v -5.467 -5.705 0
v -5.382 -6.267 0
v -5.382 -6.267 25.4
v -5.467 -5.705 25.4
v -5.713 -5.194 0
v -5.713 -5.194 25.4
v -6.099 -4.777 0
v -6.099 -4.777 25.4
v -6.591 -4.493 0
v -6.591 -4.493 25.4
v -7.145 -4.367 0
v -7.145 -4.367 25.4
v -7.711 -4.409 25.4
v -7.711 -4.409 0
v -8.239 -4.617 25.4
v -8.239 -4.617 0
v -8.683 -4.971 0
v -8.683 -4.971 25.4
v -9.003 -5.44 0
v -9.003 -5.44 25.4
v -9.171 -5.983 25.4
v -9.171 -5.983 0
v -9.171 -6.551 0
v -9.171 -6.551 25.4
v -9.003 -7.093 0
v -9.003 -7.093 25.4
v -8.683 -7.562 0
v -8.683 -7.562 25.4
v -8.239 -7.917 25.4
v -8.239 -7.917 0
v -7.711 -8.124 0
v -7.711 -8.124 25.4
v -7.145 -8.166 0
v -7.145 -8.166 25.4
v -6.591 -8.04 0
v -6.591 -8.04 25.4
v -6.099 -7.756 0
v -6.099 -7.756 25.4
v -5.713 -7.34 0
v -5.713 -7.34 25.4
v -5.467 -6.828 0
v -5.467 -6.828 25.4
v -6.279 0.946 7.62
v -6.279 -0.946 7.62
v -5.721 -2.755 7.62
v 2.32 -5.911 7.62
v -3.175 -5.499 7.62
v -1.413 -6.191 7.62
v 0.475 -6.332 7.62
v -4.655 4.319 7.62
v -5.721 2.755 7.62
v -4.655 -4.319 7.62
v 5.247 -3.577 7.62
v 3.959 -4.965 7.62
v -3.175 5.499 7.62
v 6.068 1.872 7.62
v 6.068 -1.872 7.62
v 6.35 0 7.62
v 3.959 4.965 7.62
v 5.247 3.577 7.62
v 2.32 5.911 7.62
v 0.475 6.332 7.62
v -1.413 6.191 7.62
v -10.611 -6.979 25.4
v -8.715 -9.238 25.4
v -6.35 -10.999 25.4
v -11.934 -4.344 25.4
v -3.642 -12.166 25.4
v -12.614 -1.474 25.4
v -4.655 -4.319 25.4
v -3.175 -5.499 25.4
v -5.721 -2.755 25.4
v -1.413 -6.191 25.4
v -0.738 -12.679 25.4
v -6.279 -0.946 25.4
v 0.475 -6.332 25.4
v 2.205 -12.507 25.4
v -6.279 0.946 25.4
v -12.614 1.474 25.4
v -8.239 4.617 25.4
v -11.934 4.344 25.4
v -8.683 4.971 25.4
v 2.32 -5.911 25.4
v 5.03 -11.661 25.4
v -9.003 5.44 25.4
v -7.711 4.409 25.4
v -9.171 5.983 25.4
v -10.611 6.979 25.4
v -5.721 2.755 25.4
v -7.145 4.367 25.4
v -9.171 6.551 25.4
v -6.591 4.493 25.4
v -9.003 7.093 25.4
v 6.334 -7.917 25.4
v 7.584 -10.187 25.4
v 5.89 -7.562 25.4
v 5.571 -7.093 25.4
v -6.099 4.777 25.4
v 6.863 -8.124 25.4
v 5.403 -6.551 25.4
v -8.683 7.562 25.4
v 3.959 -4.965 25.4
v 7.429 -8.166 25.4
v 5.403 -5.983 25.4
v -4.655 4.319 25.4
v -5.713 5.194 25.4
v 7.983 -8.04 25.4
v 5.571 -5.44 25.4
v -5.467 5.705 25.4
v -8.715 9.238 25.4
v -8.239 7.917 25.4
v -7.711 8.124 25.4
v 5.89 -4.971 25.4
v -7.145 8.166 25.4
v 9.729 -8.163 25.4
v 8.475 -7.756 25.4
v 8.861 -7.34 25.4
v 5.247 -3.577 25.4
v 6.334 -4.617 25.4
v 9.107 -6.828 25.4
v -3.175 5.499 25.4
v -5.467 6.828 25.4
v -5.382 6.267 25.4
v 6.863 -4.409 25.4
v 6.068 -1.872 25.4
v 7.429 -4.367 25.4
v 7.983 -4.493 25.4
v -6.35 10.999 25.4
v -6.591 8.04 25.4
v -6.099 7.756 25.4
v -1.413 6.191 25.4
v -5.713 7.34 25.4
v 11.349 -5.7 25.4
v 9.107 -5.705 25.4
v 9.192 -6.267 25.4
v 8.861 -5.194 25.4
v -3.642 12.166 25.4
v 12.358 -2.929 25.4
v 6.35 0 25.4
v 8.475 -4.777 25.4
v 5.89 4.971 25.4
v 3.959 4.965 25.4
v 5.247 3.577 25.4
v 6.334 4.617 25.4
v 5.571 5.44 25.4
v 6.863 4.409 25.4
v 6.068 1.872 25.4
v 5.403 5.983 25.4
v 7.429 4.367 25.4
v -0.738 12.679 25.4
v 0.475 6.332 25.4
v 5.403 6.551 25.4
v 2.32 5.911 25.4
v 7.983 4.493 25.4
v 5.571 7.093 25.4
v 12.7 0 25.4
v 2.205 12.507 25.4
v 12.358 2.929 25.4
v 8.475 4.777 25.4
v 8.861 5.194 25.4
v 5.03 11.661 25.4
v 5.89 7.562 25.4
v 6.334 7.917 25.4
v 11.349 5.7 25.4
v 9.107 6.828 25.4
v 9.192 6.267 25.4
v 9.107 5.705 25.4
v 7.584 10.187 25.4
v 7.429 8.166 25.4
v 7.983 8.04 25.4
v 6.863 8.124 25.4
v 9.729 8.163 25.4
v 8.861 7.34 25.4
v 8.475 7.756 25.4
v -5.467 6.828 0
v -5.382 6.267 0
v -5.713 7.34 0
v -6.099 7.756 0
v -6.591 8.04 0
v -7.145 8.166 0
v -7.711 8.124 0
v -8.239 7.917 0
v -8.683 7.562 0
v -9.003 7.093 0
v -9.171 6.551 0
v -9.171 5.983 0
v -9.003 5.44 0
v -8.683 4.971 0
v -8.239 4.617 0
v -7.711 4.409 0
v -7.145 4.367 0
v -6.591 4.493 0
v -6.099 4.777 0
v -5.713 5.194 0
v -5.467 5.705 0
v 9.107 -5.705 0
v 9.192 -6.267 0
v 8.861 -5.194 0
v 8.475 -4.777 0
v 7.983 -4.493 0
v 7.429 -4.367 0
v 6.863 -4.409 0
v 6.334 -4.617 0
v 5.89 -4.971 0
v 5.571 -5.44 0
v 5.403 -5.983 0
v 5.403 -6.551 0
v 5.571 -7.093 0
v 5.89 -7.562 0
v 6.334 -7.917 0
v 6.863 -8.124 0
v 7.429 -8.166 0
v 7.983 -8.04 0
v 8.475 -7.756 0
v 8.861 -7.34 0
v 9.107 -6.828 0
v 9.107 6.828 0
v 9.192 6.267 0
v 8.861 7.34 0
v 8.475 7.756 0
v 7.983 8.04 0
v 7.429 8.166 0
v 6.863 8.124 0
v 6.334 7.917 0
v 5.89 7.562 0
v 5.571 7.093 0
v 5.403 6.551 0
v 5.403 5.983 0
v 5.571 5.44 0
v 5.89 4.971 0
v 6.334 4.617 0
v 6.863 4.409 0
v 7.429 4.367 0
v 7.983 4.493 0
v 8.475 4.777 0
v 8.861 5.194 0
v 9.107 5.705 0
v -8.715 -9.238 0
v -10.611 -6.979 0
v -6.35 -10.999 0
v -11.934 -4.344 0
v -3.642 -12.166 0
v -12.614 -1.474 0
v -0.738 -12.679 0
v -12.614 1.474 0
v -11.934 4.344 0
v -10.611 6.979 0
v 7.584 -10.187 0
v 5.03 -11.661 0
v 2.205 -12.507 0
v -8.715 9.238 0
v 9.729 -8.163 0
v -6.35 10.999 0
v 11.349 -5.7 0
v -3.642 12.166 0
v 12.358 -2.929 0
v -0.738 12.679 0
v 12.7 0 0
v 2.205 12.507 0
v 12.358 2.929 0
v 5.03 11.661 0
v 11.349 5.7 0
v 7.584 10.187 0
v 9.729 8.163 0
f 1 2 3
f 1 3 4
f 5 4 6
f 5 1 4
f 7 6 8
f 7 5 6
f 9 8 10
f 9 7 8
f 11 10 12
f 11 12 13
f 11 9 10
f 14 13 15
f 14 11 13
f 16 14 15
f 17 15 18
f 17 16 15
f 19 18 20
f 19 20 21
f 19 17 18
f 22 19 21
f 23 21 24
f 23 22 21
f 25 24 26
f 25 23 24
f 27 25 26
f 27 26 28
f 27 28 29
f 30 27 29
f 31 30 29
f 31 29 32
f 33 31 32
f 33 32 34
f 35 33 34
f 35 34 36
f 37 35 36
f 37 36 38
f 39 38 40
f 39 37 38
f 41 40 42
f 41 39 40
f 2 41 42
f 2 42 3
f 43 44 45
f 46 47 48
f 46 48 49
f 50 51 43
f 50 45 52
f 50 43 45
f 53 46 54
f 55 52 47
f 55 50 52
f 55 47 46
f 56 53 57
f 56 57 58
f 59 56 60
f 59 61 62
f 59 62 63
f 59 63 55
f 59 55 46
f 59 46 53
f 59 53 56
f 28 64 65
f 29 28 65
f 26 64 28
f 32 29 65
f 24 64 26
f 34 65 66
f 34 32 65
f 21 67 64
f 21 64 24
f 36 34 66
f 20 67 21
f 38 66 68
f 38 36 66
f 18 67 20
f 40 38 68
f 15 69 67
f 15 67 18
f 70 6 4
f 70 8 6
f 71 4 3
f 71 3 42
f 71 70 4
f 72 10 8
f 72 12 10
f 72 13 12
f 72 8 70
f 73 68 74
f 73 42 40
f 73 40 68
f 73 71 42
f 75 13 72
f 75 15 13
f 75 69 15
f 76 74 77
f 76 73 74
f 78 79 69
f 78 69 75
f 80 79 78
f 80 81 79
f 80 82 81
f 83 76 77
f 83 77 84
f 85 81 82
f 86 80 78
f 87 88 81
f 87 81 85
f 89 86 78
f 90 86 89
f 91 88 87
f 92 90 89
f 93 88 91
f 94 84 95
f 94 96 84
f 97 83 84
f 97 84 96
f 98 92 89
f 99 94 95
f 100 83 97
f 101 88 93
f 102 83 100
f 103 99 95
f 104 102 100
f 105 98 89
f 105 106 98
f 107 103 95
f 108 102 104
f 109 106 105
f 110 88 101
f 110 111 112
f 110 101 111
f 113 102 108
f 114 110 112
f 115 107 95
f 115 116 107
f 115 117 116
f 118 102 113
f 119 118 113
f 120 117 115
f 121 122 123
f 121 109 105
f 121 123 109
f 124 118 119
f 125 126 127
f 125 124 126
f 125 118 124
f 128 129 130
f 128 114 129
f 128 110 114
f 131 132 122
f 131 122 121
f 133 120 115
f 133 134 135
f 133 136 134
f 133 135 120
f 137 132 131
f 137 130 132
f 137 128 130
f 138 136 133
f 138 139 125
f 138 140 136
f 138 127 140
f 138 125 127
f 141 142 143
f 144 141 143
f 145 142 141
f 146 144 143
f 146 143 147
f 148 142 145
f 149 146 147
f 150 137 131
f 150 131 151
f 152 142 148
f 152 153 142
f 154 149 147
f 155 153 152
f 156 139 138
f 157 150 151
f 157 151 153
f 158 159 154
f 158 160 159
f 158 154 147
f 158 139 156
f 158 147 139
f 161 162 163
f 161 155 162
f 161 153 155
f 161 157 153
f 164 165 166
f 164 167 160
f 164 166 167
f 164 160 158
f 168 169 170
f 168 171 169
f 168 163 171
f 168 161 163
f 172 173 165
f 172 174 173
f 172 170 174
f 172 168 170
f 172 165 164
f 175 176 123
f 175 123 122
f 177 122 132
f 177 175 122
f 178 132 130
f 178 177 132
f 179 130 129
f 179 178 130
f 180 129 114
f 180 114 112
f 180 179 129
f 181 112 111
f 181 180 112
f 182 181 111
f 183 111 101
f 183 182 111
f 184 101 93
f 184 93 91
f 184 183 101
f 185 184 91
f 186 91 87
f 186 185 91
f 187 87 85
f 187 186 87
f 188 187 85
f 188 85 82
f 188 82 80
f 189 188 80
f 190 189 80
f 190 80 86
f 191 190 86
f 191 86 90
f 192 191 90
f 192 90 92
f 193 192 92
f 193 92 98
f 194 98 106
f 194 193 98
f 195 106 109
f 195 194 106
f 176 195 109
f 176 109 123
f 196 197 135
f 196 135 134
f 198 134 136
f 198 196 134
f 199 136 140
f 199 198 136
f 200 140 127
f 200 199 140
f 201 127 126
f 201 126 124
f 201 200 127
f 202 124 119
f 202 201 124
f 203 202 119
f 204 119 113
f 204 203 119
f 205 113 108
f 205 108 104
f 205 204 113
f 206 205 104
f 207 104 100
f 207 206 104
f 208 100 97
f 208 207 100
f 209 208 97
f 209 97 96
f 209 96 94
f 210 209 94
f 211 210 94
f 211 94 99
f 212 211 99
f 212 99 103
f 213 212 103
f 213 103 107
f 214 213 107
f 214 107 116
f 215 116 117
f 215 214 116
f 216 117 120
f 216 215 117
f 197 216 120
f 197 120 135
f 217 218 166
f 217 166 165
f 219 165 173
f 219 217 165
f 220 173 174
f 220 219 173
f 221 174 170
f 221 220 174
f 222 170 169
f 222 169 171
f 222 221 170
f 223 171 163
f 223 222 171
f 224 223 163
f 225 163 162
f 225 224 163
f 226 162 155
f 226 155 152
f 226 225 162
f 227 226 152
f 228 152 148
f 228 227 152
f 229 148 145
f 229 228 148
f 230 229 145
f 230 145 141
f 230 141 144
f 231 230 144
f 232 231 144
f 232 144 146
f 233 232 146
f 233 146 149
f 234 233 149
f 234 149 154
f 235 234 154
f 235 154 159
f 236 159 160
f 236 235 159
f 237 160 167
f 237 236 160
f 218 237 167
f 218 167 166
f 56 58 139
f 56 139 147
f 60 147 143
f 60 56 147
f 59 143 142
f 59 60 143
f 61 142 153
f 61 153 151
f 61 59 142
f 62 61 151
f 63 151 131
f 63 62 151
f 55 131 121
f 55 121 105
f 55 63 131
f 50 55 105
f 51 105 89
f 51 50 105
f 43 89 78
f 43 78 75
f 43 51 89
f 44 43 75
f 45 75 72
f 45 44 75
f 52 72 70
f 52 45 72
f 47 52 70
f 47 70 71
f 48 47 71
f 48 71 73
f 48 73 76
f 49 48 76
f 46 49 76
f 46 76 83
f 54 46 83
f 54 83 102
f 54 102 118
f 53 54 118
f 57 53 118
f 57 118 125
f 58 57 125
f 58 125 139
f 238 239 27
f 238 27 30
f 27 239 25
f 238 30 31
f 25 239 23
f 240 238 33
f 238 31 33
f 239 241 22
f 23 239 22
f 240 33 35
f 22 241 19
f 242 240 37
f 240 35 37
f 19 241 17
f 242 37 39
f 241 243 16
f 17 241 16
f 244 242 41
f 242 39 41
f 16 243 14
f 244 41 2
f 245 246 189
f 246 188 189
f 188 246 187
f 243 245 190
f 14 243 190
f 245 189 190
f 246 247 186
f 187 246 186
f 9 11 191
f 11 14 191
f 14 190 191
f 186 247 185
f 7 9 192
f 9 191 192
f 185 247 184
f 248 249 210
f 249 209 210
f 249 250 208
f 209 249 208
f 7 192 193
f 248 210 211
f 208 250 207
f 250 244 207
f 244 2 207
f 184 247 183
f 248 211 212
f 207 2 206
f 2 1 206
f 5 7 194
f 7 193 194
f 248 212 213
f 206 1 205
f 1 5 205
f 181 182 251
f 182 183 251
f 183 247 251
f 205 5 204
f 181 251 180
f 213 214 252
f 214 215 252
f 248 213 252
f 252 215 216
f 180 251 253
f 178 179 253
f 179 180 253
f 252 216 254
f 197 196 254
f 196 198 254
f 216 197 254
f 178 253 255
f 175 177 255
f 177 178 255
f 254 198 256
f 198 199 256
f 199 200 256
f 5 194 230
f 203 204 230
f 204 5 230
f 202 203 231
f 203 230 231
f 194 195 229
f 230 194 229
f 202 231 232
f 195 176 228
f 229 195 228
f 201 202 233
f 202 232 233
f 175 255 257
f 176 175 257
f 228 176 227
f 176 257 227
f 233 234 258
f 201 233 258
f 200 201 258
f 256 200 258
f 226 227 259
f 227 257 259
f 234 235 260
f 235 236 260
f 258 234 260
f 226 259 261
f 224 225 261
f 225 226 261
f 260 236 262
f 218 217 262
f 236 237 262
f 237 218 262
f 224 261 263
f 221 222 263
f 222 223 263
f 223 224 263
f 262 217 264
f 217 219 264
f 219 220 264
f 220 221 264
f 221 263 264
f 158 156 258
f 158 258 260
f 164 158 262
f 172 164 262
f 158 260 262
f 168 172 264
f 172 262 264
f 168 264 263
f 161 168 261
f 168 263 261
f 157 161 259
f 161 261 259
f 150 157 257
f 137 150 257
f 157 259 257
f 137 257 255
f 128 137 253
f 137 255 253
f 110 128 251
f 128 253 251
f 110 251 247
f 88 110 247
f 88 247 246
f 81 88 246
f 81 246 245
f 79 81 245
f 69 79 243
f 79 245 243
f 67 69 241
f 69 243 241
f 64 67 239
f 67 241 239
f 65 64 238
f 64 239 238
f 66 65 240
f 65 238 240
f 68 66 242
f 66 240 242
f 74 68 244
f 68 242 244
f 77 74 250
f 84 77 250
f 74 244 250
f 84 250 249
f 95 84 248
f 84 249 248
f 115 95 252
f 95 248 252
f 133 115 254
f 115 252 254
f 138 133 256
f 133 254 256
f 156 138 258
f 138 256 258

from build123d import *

# Parameters (mm, degrees)
F0_R     = 12.7
F0_R_2   = 1.905
F0_R_3   = 6.35
F1_DEPTH = 25.4
F0_R_4   = 4.0005
F2_DEPTH = 7.62
F3_DEPTH = 7.62


with BuildPart() as f1:
    # F0 (on Top) → F1 (new body)
    with BuildSketch(Plane.XY):
        Circle(F0_R)
        with Locations((-7.286887, -6.266722)):
            Circle(F0_R_2, mode=Mode.SUBTRACT)
        Circle(F0_R_3, mode=Mode.SUBTRACT)
        with Locations((7.286887, -6.266722)):
            Circle(F0_R_2, mode=Mode.SUBTRACT)
        with Locations((-7.286887, 6.266722)):
            Circle(F0_R_2, mode=Mode.SUBTRACT)
        with Locations((7.286887, 6.266722)):
            Circle(F0_R_2, mode=Mode.SUBTRACT)
    extrude(amount=F1_DEPTH)

    # F0 (on Top) → F2 (join)
    with BuildSketch(Plane.XY):
        Circle(F0_R_3)
        Circle(F0_R_4, mode=Mode.SUBTRACT)
    extrude(amount=F2_DEPTH)

    # F0 (on Top) → F3 (join)
    with BuildSketch(Plane.XY):
        Circle(F0_R_4)
    extrude(amount=F3_DEPTH)


solid = f1.part
